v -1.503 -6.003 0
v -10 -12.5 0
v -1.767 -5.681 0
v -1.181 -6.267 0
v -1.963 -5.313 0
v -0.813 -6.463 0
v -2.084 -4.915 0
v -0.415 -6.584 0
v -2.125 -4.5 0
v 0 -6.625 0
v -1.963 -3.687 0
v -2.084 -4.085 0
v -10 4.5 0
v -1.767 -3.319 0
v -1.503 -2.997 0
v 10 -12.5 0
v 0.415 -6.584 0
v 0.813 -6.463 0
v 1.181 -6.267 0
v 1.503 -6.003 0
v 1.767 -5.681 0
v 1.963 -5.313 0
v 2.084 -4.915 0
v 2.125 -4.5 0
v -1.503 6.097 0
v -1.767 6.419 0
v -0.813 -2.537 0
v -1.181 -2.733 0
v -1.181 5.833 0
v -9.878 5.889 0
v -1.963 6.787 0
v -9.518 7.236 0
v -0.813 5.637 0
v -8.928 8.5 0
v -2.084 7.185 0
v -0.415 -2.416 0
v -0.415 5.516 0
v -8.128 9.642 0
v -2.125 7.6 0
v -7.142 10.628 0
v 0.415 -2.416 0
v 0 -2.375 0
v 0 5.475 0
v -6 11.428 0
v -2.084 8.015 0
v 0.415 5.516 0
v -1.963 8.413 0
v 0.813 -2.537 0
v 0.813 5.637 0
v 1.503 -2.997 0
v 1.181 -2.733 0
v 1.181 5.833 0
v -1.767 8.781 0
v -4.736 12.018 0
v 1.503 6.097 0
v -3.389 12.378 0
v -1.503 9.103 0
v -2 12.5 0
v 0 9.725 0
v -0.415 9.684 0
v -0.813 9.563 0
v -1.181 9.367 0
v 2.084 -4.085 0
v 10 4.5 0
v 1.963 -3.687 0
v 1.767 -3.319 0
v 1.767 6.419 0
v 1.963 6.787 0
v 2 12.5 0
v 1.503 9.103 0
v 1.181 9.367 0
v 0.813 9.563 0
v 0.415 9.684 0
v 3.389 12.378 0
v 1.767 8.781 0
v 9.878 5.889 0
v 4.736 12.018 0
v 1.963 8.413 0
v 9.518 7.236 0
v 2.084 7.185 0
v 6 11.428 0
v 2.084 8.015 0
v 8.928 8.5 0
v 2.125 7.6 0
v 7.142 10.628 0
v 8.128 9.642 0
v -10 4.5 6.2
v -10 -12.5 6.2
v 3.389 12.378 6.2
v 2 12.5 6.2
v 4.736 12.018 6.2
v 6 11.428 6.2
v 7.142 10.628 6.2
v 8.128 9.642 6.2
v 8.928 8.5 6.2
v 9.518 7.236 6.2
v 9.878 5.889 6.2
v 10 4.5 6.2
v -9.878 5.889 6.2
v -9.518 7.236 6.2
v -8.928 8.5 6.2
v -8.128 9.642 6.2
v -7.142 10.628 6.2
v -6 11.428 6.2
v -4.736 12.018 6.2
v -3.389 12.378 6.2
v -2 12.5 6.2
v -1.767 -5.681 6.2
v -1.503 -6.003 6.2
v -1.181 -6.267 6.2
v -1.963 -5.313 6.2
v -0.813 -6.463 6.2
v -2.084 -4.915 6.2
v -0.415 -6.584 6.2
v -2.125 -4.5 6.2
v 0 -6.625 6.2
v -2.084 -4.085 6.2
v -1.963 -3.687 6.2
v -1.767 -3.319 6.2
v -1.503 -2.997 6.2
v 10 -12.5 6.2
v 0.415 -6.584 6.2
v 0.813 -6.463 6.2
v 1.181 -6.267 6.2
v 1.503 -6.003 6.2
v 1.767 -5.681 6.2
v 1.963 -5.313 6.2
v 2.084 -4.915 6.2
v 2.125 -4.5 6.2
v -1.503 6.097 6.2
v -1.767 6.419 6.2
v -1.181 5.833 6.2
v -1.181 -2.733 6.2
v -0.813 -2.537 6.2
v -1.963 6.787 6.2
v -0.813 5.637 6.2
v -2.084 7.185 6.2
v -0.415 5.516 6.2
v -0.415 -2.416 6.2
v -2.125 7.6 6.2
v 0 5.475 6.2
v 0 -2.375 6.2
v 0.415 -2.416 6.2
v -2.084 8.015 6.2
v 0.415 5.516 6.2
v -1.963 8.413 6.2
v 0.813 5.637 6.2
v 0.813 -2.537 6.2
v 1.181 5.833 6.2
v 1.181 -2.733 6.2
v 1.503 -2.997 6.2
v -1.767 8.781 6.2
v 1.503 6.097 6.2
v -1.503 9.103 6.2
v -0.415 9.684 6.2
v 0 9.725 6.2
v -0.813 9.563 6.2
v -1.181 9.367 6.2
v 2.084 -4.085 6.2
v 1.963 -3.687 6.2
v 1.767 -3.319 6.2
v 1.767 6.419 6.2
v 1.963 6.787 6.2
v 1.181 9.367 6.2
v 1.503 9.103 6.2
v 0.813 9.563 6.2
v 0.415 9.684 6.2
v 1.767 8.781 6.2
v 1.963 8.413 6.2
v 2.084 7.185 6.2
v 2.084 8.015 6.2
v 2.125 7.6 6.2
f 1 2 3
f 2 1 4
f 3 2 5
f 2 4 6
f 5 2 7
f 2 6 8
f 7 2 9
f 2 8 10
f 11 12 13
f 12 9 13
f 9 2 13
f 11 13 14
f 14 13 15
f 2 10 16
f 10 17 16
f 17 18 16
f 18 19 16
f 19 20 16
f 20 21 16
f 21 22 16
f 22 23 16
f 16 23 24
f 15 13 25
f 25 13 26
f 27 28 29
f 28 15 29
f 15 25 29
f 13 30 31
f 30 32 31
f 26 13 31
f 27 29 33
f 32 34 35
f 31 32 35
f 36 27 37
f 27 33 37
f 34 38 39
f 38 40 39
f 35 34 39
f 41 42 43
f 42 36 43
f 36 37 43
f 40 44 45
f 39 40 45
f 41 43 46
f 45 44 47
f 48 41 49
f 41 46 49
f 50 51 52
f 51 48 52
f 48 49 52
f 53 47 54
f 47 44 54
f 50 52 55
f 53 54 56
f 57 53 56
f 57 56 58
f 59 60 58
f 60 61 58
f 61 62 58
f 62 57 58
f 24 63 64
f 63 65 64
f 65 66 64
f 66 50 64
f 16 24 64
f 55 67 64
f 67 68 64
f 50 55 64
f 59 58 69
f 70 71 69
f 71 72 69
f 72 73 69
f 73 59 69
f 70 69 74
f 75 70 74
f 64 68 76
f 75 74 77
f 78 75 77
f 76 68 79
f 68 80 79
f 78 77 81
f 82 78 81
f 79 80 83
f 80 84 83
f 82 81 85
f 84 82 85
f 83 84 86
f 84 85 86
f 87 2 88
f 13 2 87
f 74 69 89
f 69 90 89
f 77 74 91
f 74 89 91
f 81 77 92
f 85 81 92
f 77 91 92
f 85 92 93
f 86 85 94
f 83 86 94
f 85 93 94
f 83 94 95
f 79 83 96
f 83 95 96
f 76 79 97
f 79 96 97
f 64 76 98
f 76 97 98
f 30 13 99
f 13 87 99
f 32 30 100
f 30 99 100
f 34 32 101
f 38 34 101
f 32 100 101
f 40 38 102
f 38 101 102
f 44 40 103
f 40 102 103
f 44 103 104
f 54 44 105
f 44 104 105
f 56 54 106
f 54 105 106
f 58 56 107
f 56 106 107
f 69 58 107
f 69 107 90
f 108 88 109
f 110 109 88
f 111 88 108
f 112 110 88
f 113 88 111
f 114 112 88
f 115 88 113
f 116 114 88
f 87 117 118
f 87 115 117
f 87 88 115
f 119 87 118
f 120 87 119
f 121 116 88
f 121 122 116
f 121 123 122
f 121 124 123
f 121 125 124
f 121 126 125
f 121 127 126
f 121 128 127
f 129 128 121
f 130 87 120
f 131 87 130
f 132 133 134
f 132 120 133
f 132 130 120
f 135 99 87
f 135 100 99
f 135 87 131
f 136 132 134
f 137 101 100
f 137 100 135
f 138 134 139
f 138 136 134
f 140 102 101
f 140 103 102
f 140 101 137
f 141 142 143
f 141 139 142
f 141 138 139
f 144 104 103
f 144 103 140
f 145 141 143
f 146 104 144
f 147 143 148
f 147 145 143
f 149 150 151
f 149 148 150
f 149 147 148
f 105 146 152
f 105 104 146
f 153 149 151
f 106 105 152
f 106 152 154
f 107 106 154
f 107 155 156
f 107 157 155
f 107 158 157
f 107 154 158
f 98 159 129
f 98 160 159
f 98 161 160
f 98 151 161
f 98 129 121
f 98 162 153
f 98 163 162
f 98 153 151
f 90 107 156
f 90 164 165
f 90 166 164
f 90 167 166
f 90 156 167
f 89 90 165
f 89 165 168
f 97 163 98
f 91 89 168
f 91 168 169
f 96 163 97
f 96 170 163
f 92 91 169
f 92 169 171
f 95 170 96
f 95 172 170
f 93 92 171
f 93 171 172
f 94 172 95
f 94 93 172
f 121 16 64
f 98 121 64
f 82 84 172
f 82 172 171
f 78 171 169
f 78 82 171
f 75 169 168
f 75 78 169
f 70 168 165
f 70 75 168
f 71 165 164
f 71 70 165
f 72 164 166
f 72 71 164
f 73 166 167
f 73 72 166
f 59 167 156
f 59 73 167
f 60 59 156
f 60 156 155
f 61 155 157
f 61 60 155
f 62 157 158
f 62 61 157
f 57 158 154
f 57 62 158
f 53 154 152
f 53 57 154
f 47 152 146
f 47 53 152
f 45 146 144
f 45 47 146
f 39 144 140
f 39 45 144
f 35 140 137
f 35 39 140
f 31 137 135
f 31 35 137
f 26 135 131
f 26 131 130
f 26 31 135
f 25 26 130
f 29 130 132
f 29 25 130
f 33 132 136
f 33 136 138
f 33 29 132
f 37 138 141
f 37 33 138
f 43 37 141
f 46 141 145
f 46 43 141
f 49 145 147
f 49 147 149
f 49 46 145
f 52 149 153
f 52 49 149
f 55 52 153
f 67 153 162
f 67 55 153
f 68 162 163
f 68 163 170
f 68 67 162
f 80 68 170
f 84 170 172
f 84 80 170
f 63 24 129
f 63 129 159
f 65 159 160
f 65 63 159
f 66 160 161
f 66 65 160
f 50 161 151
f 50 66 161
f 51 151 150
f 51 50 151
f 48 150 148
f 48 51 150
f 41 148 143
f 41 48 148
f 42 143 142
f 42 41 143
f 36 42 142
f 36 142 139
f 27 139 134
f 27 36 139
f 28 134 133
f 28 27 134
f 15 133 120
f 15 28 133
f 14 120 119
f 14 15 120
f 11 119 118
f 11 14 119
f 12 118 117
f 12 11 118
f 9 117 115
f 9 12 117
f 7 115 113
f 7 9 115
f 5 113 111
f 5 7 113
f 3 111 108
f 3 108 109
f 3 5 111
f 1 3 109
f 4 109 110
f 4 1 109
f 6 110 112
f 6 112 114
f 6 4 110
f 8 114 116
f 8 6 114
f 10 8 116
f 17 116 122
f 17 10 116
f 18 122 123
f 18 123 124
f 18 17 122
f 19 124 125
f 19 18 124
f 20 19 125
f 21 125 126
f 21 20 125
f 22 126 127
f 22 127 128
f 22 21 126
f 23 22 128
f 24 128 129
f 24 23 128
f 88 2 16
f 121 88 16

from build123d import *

# Parameters (mm, degrees)
F0_W     = 20
F0_H     = 25
F0_R     = 2.125
F1_DEPTH = 6.2
F2_R     = 8


with BuildPart() as f1:
    # F0 (on Top) → F1 (new body)
    with BuildSketch(Plane.XY):
        Rectangle(F0_W, F0_H)
        with Locations((0, -4.5)):
            Circle(F0_R, mode=Mode.SUBTRACT)
        with Locations((0, 7.6)):
            Circle(F0_R, mode=Mode.SUBTRACT)
    extrude(amount=F1_DEPTH)

    # F2
    f2_edges = [f1.edges().sort_by_distance(p)[0] for p in [
        (-10, 12.5, 3.1),
        (10, 12.5, 3.1),
    ]]
    fillet(f2_edges, radius=F2_R)


solid = f1.part
